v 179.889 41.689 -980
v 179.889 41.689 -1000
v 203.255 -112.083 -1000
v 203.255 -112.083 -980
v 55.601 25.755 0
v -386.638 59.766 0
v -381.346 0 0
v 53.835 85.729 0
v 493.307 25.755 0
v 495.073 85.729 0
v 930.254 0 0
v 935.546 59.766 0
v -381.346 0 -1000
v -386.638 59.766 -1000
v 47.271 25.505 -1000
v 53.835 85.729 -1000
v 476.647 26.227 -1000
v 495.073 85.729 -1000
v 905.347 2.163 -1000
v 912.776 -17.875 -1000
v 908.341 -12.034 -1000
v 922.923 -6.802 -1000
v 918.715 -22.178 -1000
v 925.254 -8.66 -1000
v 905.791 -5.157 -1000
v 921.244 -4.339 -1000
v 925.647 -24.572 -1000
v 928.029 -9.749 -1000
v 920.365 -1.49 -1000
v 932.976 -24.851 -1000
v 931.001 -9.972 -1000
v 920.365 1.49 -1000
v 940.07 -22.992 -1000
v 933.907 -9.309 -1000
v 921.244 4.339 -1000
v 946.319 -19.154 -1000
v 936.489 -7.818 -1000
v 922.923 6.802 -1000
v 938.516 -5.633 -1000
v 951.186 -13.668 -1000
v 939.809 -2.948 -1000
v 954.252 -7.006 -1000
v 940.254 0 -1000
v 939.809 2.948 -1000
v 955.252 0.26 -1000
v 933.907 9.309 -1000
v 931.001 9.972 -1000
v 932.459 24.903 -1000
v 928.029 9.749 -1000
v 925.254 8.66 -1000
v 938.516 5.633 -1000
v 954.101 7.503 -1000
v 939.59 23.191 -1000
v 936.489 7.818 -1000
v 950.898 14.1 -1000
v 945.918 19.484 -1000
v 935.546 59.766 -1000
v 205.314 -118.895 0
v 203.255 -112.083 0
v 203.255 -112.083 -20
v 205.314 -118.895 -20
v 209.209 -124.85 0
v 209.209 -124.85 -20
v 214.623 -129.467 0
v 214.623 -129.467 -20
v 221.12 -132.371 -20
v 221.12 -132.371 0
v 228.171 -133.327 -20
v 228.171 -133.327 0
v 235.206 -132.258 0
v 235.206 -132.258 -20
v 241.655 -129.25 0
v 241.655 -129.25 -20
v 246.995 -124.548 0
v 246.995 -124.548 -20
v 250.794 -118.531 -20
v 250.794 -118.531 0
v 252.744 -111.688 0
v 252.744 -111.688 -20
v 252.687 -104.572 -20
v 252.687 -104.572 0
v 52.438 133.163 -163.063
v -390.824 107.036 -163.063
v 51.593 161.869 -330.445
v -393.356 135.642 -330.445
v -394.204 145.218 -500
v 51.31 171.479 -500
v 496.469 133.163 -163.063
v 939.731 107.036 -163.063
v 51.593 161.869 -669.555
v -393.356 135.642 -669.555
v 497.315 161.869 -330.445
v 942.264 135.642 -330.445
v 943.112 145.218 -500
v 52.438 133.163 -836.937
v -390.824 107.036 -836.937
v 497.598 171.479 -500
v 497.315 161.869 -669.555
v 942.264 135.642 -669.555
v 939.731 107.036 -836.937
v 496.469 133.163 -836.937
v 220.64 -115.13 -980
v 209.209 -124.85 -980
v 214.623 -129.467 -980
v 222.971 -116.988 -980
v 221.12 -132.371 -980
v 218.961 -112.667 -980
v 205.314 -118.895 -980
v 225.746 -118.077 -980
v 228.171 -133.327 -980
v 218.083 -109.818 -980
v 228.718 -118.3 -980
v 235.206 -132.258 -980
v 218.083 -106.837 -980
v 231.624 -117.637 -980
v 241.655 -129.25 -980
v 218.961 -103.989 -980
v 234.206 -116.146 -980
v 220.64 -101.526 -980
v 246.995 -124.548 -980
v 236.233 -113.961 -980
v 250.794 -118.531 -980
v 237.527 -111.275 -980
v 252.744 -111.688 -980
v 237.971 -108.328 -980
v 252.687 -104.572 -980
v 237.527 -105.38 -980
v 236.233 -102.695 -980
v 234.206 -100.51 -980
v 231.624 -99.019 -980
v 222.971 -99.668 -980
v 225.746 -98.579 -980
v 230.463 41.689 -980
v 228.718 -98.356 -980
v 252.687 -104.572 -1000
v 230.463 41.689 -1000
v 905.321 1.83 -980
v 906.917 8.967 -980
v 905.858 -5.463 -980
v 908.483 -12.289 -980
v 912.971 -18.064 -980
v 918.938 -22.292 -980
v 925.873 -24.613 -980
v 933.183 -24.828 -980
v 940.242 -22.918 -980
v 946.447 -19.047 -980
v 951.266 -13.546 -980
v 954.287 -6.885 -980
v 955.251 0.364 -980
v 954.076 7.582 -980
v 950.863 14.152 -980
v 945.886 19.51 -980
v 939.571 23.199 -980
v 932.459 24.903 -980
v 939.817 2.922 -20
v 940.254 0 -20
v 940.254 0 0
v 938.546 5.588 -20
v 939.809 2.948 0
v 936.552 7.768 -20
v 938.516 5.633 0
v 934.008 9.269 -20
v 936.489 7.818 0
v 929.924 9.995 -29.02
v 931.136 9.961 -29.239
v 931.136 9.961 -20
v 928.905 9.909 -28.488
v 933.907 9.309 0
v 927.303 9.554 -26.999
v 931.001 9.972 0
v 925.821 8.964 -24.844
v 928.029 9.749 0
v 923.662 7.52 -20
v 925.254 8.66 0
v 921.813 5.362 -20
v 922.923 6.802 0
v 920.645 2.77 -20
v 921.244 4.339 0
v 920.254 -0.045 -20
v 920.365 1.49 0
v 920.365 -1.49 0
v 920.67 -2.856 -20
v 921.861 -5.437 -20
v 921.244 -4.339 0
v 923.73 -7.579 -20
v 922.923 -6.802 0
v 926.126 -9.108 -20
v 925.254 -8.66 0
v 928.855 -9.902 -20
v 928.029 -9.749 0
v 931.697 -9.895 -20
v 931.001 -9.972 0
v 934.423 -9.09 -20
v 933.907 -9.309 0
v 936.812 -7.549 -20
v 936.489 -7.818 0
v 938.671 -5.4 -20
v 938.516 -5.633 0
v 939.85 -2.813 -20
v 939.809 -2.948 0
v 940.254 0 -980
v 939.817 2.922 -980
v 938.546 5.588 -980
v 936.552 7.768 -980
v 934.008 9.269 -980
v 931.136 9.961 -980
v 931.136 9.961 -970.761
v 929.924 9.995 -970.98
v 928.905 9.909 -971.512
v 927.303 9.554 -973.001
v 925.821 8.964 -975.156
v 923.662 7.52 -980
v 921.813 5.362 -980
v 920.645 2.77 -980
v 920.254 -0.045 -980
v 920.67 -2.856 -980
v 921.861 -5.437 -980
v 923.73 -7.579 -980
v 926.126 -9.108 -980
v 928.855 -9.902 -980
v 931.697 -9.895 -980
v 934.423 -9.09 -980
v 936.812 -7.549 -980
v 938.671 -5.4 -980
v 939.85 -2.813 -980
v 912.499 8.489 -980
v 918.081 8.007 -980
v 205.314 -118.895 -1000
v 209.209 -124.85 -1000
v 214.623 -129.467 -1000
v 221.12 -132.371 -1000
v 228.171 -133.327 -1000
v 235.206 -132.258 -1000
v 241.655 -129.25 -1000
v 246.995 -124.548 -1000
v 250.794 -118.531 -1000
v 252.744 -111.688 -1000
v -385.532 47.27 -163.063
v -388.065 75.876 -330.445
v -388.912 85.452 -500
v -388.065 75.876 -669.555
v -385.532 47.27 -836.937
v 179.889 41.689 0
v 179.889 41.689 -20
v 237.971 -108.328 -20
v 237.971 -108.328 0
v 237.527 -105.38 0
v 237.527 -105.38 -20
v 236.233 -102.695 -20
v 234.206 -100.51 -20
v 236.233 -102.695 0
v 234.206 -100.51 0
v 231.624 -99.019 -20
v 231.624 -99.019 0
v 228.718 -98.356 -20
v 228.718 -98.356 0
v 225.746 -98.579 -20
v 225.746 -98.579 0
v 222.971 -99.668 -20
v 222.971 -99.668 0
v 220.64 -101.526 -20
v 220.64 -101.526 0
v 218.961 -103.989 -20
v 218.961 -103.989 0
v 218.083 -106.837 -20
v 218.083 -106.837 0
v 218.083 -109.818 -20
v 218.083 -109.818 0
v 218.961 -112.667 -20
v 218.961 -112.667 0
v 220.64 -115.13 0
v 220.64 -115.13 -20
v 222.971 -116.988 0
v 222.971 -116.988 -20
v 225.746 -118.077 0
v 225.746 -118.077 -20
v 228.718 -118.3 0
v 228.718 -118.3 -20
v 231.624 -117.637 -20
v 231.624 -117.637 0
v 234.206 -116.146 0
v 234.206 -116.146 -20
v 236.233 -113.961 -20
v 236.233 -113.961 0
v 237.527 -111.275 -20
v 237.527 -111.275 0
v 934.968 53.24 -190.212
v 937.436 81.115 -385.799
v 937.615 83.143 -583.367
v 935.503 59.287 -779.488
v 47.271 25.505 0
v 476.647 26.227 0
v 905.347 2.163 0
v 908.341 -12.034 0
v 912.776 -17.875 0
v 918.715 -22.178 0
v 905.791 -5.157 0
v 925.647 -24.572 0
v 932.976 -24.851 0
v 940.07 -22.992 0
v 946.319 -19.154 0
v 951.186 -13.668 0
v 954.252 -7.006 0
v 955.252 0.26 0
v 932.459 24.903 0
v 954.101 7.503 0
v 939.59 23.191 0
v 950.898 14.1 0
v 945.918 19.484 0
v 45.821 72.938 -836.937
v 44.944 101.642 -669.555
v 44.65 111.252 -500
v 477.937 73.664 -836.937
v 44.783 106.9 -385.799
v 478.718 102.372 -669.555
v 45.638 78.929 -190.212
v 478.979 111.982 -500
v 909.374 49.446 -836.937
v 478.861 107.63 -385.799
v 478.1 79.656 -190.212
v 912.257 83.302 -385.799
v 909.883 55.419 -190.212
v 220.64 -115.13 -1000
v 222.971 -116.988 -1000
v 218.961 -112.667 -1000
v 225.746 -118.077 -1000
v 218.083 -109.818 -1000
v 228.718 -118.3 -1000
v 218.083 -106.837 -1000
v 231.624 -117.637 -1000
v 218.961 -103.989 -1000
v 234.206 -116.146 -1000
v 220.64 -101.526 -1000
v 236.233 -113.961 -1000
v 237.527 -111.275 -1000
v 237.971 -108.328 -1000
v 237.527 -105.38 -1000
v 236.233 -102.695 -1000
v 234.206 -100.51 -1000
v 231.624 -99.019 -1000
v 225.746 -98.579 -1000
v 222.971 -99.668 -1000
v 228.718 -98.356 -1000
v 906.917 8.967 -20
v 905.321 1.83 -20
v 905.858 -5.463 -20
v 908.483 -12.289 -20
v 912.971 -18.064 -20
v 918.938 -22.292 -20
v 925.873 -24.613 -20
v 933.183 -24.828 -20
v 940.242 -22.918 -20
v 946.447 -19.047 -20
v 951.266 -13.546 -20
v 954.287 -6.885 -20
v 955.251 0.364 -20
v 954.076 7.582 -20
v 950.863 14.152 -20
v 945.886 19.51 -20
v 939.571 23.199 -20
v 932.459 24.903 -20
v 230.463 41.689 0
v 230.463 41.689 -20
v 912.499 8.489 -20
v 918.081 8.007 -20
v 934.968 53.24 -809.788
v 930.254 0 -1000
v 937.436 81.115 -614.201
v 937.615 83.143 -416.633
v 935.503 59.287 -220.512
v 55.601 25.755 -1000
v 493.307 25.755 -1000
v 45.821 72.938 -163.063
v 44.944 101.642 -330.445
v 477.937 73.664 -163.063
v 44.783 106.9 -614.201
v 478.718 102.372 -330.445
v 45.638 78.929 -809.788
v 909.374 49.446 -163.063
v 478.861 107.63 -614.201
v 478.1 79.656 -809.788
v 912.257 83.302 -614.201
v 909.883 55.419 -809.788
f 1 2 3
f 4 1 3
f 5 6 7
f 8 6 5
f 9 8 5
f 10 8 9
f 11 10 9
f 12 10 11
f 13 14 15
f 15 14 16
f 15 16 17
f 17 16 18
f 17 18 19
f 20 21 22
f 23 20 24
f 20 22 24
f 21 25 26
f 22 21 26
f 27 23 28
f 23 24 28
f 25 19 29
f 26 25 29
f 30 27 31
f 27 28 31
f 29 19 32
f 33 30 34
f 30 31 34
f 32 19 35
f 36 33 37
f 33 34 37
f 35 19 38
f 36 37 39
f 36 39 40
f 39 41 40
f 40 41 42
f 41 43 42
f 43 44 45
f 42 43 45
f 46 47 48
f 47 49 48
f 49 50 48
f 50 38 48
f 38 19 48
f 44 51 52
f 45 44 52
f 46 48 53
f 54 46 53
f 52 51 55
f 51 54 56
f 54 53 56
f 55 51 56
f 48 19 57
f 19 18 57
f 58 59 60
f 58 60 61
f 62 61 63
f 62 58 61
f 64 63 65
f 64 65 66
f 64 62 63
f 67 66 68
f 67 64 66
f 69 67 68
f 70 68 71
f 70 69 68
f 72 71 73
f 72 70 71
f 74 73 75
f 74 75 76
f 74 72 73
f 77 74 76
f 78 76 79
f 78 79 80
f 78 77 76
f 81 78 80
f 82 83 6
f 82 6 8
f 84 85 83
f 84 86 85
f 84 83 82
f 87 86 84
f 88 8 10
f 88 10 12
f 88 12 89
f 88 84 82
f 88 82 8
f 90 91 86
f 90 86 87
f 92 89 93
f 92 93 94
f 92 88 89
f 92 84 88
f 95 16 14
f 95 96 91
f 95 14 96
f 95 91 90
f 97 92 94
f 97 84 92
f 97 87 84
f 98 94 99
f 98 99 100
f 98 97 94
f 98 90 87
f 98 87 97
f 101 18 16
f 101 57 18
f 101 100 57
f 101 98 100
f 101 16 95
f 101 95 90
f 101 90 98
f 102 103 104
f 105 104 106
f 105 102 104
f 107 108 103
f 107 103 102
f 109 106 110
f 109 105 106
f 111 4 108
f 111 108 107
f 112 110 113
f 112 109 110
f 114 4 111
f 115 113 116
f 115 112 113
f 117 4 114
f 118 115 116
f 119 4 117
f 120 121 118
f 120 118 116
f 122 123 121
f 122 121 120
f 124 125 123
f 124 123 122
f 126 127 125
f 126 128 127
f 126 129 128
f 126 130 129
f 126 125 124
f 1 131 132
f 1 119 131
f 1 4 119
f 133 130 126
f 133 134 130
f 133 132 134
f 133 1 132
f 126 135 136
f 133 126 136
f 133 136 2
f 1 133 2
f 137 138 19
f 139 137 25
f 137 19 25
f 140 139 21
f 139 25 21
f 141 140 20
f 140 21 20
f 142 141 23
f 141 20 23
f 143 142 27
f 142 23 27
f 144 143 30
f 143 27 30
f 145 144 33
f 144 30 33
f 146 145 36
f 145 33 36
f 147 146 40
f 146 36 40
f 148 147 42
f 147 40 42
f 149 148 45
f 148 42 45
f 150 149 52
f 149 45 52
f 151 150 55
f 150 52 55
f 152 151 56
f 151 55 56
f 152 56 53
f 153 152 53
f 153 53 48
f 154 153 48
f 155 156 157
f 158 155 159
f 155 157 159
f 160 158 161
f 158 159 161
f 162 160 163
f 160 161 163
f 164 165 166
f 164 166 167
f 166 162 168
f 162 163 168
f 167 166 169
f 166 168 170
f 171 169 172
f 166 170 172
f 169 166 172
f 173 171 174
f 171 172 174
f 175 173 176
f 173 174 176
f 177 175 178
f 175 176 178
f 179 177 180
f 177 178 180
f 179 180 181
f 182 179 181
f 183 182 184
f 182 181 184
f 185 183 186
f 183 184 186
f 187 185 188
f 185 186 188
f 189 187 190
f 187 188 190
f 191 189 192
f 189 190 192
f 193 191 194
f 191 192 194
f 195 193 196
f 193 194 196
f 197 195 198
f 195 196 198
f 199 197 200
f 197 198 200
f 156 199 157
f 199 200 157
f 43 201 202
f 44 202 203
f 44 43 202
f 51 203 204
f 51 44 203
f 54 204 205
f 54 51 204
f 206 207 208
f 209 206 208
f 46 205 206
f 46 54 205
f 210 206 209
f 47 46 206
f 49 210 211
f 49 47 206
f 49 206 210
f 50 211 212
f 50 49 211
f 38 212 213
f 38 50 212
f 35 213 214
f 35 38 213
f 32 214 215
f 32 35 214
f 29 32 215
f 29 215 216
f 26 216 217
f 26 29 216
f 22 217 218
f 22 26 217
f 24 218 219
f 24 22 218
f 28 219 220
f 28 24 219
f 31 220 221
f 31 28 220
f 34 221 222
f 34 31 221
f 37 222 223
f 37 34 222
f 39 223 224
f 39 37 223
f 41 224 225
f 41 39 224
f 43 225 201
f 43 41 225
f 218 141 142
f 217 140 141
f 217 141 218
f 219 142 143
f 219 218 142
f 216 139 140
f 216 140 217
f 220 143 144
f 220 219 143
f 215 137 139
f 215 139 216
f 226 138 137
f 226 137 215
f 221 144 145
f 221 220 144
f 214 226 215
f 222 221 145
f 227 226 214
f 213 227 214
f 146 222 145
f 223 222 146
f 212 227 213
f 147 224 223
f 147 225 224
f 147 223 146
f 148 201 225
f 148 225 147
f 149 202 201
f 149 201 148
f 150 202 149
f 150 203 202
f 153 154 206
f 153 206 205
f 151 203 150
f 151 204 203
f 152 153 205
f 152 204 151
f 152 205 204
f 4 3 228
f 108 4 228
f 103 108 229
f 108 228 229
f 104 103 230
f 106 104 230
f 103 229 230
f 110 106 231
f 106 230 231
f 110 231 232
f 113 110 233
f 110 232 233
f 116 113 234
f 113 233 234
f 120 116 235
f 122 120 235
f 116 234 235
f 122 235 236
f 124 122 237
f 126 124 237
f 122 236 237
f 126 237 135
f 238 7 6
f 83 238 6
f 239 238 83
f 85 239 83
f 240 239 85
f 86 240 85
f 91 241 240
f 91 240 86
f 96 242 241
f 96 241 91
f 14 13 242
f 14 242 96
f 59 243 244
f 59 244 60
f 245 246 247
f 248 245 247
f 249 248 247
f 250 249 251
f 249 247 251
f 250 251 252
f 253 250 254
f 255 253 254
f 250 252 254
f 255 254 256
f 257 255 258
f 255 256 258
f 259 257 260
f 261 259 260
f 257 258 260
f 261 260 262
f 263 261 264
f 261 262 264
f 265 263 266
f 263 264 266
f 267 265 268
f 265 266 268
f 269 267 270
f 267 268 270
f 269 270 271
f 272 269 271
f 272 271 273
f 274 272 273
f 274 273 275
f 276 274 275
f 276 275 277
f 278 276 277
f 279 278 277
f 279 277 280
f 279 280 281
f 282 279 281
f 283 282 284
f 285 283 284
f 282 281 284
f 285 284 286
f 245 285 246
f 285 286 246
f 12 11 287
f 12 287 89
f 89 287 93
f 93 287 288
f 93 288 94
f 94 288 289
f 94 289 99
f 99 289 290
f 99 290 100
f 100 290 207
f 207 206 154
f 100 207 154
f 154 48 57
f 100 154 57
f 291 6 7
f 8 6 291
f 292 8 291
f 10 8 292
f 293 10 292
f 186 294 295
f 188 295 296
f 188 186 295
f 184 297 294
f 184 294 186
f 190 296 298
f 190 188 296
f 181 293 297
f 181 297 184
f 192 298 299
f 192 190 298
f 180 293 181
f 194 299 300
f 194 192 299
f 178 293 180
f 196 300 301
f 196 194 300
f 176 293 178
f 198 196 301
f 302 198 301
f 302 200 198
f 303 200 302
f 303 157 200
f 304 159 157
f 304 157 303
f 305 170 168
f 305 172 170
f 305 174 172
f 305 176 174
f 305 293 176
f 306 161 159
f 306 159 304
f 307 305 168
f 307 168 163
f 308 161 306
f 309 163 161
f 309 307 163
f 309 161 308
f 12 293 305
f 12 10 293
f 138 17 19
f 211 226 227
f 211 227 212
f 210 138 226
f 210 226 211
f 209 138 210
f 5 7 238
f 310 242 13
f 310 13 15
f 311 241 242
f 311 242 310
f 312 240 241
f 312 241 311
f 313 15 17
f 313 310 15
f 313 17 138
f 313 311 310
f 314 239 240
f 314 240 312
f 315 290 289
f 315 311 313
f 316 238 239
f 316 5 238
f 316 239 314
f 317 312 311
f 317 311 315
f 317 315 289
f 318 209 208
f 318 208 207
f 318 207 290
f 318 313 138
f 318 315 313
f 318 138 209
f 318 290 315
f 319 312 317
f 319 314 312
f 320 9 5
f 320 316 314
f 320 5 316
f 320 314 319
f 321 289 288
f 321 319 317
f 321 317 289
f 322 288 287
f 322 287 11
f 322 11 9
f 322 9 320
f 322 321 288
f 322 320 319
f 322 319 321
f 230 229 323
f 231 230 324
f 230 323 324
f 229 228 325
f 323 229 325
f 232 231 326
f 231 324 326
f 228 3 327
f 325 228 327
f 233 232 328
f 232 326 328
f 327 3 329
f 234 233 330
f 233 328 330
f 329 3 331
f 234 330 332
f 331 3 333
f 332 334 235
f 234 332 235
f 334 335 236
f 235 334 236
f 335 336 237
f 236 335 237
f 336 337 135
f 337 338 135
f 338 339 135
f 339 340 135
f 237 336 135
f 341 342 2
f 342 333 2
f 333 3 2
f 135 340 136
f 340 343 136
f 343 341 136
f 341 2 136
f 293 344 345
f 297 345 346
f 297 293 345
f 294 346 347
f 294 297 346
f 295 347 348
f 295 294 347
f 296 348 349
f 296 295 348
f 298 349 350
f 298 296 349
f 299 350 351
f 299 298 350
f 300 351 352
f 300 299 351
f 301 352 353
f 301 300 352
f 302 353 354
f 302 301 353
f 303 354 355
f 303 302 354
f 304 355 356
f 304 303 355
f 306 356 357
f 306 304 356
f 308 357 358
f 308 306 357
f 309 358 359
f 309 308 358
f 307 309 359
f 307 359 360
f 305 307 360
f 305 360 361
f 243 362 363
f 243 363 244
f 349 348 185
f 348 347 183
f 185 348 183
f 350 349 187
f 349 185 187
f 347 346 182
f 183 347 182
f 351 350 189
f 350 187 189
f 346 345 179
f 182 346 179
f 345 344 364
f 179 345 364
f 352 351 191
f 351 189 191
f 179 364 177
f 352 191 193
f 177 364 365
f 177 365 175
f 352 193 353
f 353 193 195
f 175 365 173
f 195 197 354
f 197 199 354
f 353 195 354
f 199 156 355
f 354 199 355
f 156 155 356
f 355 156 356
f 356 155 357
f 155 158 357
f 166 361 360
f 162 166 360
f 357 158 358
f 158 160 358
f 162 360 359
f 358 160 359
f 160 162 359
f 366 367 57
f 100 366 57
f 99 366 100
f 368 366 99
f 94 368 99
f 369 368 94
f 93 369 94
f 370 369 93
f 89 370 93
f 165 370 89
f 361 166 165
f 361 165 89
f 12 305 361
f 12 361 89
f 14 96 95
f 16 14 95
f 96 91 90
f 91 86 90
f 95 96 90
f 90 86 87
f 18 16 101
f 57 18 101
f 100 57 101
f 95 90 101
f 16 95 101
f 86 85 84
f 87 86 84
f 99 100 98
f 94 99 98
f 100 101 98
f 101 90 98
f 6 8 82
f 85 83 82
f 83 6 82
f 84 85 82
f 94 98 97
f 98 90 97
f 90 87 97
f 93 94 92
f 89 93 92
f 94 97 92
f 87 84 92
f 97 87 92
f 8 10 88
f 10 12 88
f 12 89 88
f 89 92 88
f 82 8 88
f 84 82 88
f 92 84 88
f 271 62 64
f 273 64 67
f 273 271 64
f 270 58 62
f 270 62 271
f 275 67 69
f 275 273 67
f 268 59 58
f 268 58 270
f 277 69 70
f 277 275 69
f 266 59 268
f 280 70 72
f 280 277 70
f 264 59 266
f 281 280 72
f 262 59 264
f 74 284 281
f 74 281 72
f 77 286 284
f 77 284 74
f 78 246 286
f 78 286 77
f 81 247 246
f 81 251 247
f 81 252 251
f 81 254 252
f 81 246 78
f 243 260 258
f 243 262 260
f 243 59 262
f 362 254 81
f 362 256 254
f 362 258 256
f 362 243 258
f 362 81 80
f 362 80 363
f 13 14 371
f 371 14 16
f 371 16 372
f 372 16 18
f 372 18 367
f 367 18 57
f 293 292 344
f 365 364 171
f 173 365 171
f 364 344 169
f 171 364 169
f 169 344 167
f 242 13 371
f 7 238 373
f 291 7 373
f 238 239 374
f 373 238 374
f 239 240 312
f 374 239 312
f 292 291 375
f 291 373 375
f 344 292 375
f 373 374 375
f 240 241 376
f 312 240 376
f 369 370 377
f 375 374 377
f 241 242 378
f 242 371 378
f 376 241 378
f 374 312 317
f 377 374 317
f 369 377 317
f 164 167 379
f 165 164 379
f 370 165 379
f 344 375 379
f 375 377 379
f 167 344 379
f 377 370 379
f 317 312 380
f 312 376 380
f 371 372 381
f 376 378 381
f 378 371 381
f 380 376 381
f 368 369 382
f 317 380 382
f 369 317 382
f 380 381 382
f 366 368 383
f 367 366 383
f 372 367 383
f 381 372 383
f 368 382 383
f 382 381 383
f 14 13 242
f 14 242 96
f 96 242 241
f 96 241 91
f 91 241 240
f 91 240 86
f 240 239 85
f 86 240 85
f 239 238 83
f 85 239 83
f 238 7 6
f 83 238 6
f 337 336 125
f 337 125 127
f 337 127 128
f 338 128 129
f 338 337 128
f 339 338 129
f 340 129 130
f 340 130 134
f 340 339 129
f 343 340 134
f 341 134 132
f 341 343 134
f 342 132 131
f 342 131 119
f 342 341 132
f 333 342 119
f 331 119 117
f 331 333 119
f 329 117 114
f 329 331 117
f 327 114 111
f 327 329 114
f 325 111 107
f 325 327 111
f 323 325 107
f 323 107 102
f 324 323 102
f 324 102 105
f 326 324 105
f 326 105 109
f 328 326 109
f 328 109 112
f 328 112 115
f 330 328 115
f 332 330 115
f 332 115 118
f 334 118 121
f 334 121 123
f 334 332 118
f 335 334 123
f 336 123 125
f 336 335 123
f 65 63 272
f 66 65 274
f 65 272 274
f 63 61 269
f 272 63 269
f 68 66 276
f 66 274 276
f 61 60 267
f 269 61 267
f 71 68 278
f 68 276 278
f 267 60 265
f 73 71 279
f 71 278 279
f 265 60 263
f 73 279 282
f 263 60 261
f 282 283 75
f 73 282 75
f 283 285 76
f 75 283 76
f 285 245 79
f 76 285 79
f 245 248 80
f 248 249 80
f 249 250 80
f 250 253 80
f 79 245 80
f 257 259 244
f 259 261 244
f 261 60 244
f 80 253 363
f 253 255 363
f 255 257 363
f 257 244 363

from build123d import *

# Parameters (mm, degrees)
SKETCH3_R           = 10
BOSS_EXTRUDE1_DEPTH = 20
SKETCH4_R           = 25
BOSS_EXTRUDE2_DEPTH = 20
SKETCH5_R           = 10
CUT_EXTRUDE1_DEPTH  = 40


with BuildPart() as part:
    # Sweep1: sweep along a path in Sketch1
    with BuildLine(Plane.XY) as sweep1_path:
        ThreePointArc((-381.346255507, 0), (274.453744493, 28.976752889), (930.253744493, 0))
    # Sketch2 → Sweep1 (sweep)
    with BuildSketch(Plane(origin=(-381.346255507, 0, 0), x_dir=(0, 0, -1), z_dir=(0.996102918, 0.088198507, 0))):
        with BuildLine():
            Line((1000, 0), (1000, 60))
            ThreePointArc((1000, 60), (500, 145.786437627), (0, 60))
            Line((0, 60), (0, 0))
            ThreePointArc((0, 0), (500, 85.786437627), (1000, 0))
        make_face()
    sweep(path=sweep1_path.line)

    # Sketch4 → Boss-Extrude2 (add)
    with BuildSketch(Plane.XY):
        with Locations((930.253744493, 0)):
            Circle(SKETCH4_R)
    extrude(amount=-BOSS_EXTRUDE2_DEPTH)

    # Sketch5 → Cut-Extrude1 (cut)
    with BuildSketch(Plane.XY):
        with Locations((930.253744493, 0)):
            Circle(SKETCH5_R)
    extrude(amount=-CUT_EXTRUDE1_DEPTH, mode=Mode.SUBTRACT)


with BuildPart() as body_2:
    # Sketch3 → Boss-Extrude1 (new body)
    with BuildSketch(Plane.XY):
        with BuildLine():
            Line((230.462804943, 41.688976459), (179.888879124, 41.688976459))
            Line((179.888879124, 41.688976459), (203.254594848, -112.083465063))
            ThreePointArc((203.254594848, -112.083465063), (231.726528195, -133.044118954), (252.687182085, -104.572185607))
            Line((252.687182085, -104.572185607), (230.462804943, 41.688976459))
        make_face()
        with Locations((227.970888467, -108.327825335)):
            Circle(SKETCH3_R, mode=Mode.SUBTRACT)
    extrude(amount=-BOSS_EXTRUDE1_DEPTH)


with BuildPart() as body_3:
    # Mirror5: mirrored copy
    add(body_2.part.mirror(Plane.XY.offset(-500)))


with BuildPart() as body_4:
    # Mirror5 2: mirrored copy
    add(part.part.mirror(Plane.XY.offset(-500)))


solid = Compound([part.part, body_2.part, body_3.part, body_4.part])
